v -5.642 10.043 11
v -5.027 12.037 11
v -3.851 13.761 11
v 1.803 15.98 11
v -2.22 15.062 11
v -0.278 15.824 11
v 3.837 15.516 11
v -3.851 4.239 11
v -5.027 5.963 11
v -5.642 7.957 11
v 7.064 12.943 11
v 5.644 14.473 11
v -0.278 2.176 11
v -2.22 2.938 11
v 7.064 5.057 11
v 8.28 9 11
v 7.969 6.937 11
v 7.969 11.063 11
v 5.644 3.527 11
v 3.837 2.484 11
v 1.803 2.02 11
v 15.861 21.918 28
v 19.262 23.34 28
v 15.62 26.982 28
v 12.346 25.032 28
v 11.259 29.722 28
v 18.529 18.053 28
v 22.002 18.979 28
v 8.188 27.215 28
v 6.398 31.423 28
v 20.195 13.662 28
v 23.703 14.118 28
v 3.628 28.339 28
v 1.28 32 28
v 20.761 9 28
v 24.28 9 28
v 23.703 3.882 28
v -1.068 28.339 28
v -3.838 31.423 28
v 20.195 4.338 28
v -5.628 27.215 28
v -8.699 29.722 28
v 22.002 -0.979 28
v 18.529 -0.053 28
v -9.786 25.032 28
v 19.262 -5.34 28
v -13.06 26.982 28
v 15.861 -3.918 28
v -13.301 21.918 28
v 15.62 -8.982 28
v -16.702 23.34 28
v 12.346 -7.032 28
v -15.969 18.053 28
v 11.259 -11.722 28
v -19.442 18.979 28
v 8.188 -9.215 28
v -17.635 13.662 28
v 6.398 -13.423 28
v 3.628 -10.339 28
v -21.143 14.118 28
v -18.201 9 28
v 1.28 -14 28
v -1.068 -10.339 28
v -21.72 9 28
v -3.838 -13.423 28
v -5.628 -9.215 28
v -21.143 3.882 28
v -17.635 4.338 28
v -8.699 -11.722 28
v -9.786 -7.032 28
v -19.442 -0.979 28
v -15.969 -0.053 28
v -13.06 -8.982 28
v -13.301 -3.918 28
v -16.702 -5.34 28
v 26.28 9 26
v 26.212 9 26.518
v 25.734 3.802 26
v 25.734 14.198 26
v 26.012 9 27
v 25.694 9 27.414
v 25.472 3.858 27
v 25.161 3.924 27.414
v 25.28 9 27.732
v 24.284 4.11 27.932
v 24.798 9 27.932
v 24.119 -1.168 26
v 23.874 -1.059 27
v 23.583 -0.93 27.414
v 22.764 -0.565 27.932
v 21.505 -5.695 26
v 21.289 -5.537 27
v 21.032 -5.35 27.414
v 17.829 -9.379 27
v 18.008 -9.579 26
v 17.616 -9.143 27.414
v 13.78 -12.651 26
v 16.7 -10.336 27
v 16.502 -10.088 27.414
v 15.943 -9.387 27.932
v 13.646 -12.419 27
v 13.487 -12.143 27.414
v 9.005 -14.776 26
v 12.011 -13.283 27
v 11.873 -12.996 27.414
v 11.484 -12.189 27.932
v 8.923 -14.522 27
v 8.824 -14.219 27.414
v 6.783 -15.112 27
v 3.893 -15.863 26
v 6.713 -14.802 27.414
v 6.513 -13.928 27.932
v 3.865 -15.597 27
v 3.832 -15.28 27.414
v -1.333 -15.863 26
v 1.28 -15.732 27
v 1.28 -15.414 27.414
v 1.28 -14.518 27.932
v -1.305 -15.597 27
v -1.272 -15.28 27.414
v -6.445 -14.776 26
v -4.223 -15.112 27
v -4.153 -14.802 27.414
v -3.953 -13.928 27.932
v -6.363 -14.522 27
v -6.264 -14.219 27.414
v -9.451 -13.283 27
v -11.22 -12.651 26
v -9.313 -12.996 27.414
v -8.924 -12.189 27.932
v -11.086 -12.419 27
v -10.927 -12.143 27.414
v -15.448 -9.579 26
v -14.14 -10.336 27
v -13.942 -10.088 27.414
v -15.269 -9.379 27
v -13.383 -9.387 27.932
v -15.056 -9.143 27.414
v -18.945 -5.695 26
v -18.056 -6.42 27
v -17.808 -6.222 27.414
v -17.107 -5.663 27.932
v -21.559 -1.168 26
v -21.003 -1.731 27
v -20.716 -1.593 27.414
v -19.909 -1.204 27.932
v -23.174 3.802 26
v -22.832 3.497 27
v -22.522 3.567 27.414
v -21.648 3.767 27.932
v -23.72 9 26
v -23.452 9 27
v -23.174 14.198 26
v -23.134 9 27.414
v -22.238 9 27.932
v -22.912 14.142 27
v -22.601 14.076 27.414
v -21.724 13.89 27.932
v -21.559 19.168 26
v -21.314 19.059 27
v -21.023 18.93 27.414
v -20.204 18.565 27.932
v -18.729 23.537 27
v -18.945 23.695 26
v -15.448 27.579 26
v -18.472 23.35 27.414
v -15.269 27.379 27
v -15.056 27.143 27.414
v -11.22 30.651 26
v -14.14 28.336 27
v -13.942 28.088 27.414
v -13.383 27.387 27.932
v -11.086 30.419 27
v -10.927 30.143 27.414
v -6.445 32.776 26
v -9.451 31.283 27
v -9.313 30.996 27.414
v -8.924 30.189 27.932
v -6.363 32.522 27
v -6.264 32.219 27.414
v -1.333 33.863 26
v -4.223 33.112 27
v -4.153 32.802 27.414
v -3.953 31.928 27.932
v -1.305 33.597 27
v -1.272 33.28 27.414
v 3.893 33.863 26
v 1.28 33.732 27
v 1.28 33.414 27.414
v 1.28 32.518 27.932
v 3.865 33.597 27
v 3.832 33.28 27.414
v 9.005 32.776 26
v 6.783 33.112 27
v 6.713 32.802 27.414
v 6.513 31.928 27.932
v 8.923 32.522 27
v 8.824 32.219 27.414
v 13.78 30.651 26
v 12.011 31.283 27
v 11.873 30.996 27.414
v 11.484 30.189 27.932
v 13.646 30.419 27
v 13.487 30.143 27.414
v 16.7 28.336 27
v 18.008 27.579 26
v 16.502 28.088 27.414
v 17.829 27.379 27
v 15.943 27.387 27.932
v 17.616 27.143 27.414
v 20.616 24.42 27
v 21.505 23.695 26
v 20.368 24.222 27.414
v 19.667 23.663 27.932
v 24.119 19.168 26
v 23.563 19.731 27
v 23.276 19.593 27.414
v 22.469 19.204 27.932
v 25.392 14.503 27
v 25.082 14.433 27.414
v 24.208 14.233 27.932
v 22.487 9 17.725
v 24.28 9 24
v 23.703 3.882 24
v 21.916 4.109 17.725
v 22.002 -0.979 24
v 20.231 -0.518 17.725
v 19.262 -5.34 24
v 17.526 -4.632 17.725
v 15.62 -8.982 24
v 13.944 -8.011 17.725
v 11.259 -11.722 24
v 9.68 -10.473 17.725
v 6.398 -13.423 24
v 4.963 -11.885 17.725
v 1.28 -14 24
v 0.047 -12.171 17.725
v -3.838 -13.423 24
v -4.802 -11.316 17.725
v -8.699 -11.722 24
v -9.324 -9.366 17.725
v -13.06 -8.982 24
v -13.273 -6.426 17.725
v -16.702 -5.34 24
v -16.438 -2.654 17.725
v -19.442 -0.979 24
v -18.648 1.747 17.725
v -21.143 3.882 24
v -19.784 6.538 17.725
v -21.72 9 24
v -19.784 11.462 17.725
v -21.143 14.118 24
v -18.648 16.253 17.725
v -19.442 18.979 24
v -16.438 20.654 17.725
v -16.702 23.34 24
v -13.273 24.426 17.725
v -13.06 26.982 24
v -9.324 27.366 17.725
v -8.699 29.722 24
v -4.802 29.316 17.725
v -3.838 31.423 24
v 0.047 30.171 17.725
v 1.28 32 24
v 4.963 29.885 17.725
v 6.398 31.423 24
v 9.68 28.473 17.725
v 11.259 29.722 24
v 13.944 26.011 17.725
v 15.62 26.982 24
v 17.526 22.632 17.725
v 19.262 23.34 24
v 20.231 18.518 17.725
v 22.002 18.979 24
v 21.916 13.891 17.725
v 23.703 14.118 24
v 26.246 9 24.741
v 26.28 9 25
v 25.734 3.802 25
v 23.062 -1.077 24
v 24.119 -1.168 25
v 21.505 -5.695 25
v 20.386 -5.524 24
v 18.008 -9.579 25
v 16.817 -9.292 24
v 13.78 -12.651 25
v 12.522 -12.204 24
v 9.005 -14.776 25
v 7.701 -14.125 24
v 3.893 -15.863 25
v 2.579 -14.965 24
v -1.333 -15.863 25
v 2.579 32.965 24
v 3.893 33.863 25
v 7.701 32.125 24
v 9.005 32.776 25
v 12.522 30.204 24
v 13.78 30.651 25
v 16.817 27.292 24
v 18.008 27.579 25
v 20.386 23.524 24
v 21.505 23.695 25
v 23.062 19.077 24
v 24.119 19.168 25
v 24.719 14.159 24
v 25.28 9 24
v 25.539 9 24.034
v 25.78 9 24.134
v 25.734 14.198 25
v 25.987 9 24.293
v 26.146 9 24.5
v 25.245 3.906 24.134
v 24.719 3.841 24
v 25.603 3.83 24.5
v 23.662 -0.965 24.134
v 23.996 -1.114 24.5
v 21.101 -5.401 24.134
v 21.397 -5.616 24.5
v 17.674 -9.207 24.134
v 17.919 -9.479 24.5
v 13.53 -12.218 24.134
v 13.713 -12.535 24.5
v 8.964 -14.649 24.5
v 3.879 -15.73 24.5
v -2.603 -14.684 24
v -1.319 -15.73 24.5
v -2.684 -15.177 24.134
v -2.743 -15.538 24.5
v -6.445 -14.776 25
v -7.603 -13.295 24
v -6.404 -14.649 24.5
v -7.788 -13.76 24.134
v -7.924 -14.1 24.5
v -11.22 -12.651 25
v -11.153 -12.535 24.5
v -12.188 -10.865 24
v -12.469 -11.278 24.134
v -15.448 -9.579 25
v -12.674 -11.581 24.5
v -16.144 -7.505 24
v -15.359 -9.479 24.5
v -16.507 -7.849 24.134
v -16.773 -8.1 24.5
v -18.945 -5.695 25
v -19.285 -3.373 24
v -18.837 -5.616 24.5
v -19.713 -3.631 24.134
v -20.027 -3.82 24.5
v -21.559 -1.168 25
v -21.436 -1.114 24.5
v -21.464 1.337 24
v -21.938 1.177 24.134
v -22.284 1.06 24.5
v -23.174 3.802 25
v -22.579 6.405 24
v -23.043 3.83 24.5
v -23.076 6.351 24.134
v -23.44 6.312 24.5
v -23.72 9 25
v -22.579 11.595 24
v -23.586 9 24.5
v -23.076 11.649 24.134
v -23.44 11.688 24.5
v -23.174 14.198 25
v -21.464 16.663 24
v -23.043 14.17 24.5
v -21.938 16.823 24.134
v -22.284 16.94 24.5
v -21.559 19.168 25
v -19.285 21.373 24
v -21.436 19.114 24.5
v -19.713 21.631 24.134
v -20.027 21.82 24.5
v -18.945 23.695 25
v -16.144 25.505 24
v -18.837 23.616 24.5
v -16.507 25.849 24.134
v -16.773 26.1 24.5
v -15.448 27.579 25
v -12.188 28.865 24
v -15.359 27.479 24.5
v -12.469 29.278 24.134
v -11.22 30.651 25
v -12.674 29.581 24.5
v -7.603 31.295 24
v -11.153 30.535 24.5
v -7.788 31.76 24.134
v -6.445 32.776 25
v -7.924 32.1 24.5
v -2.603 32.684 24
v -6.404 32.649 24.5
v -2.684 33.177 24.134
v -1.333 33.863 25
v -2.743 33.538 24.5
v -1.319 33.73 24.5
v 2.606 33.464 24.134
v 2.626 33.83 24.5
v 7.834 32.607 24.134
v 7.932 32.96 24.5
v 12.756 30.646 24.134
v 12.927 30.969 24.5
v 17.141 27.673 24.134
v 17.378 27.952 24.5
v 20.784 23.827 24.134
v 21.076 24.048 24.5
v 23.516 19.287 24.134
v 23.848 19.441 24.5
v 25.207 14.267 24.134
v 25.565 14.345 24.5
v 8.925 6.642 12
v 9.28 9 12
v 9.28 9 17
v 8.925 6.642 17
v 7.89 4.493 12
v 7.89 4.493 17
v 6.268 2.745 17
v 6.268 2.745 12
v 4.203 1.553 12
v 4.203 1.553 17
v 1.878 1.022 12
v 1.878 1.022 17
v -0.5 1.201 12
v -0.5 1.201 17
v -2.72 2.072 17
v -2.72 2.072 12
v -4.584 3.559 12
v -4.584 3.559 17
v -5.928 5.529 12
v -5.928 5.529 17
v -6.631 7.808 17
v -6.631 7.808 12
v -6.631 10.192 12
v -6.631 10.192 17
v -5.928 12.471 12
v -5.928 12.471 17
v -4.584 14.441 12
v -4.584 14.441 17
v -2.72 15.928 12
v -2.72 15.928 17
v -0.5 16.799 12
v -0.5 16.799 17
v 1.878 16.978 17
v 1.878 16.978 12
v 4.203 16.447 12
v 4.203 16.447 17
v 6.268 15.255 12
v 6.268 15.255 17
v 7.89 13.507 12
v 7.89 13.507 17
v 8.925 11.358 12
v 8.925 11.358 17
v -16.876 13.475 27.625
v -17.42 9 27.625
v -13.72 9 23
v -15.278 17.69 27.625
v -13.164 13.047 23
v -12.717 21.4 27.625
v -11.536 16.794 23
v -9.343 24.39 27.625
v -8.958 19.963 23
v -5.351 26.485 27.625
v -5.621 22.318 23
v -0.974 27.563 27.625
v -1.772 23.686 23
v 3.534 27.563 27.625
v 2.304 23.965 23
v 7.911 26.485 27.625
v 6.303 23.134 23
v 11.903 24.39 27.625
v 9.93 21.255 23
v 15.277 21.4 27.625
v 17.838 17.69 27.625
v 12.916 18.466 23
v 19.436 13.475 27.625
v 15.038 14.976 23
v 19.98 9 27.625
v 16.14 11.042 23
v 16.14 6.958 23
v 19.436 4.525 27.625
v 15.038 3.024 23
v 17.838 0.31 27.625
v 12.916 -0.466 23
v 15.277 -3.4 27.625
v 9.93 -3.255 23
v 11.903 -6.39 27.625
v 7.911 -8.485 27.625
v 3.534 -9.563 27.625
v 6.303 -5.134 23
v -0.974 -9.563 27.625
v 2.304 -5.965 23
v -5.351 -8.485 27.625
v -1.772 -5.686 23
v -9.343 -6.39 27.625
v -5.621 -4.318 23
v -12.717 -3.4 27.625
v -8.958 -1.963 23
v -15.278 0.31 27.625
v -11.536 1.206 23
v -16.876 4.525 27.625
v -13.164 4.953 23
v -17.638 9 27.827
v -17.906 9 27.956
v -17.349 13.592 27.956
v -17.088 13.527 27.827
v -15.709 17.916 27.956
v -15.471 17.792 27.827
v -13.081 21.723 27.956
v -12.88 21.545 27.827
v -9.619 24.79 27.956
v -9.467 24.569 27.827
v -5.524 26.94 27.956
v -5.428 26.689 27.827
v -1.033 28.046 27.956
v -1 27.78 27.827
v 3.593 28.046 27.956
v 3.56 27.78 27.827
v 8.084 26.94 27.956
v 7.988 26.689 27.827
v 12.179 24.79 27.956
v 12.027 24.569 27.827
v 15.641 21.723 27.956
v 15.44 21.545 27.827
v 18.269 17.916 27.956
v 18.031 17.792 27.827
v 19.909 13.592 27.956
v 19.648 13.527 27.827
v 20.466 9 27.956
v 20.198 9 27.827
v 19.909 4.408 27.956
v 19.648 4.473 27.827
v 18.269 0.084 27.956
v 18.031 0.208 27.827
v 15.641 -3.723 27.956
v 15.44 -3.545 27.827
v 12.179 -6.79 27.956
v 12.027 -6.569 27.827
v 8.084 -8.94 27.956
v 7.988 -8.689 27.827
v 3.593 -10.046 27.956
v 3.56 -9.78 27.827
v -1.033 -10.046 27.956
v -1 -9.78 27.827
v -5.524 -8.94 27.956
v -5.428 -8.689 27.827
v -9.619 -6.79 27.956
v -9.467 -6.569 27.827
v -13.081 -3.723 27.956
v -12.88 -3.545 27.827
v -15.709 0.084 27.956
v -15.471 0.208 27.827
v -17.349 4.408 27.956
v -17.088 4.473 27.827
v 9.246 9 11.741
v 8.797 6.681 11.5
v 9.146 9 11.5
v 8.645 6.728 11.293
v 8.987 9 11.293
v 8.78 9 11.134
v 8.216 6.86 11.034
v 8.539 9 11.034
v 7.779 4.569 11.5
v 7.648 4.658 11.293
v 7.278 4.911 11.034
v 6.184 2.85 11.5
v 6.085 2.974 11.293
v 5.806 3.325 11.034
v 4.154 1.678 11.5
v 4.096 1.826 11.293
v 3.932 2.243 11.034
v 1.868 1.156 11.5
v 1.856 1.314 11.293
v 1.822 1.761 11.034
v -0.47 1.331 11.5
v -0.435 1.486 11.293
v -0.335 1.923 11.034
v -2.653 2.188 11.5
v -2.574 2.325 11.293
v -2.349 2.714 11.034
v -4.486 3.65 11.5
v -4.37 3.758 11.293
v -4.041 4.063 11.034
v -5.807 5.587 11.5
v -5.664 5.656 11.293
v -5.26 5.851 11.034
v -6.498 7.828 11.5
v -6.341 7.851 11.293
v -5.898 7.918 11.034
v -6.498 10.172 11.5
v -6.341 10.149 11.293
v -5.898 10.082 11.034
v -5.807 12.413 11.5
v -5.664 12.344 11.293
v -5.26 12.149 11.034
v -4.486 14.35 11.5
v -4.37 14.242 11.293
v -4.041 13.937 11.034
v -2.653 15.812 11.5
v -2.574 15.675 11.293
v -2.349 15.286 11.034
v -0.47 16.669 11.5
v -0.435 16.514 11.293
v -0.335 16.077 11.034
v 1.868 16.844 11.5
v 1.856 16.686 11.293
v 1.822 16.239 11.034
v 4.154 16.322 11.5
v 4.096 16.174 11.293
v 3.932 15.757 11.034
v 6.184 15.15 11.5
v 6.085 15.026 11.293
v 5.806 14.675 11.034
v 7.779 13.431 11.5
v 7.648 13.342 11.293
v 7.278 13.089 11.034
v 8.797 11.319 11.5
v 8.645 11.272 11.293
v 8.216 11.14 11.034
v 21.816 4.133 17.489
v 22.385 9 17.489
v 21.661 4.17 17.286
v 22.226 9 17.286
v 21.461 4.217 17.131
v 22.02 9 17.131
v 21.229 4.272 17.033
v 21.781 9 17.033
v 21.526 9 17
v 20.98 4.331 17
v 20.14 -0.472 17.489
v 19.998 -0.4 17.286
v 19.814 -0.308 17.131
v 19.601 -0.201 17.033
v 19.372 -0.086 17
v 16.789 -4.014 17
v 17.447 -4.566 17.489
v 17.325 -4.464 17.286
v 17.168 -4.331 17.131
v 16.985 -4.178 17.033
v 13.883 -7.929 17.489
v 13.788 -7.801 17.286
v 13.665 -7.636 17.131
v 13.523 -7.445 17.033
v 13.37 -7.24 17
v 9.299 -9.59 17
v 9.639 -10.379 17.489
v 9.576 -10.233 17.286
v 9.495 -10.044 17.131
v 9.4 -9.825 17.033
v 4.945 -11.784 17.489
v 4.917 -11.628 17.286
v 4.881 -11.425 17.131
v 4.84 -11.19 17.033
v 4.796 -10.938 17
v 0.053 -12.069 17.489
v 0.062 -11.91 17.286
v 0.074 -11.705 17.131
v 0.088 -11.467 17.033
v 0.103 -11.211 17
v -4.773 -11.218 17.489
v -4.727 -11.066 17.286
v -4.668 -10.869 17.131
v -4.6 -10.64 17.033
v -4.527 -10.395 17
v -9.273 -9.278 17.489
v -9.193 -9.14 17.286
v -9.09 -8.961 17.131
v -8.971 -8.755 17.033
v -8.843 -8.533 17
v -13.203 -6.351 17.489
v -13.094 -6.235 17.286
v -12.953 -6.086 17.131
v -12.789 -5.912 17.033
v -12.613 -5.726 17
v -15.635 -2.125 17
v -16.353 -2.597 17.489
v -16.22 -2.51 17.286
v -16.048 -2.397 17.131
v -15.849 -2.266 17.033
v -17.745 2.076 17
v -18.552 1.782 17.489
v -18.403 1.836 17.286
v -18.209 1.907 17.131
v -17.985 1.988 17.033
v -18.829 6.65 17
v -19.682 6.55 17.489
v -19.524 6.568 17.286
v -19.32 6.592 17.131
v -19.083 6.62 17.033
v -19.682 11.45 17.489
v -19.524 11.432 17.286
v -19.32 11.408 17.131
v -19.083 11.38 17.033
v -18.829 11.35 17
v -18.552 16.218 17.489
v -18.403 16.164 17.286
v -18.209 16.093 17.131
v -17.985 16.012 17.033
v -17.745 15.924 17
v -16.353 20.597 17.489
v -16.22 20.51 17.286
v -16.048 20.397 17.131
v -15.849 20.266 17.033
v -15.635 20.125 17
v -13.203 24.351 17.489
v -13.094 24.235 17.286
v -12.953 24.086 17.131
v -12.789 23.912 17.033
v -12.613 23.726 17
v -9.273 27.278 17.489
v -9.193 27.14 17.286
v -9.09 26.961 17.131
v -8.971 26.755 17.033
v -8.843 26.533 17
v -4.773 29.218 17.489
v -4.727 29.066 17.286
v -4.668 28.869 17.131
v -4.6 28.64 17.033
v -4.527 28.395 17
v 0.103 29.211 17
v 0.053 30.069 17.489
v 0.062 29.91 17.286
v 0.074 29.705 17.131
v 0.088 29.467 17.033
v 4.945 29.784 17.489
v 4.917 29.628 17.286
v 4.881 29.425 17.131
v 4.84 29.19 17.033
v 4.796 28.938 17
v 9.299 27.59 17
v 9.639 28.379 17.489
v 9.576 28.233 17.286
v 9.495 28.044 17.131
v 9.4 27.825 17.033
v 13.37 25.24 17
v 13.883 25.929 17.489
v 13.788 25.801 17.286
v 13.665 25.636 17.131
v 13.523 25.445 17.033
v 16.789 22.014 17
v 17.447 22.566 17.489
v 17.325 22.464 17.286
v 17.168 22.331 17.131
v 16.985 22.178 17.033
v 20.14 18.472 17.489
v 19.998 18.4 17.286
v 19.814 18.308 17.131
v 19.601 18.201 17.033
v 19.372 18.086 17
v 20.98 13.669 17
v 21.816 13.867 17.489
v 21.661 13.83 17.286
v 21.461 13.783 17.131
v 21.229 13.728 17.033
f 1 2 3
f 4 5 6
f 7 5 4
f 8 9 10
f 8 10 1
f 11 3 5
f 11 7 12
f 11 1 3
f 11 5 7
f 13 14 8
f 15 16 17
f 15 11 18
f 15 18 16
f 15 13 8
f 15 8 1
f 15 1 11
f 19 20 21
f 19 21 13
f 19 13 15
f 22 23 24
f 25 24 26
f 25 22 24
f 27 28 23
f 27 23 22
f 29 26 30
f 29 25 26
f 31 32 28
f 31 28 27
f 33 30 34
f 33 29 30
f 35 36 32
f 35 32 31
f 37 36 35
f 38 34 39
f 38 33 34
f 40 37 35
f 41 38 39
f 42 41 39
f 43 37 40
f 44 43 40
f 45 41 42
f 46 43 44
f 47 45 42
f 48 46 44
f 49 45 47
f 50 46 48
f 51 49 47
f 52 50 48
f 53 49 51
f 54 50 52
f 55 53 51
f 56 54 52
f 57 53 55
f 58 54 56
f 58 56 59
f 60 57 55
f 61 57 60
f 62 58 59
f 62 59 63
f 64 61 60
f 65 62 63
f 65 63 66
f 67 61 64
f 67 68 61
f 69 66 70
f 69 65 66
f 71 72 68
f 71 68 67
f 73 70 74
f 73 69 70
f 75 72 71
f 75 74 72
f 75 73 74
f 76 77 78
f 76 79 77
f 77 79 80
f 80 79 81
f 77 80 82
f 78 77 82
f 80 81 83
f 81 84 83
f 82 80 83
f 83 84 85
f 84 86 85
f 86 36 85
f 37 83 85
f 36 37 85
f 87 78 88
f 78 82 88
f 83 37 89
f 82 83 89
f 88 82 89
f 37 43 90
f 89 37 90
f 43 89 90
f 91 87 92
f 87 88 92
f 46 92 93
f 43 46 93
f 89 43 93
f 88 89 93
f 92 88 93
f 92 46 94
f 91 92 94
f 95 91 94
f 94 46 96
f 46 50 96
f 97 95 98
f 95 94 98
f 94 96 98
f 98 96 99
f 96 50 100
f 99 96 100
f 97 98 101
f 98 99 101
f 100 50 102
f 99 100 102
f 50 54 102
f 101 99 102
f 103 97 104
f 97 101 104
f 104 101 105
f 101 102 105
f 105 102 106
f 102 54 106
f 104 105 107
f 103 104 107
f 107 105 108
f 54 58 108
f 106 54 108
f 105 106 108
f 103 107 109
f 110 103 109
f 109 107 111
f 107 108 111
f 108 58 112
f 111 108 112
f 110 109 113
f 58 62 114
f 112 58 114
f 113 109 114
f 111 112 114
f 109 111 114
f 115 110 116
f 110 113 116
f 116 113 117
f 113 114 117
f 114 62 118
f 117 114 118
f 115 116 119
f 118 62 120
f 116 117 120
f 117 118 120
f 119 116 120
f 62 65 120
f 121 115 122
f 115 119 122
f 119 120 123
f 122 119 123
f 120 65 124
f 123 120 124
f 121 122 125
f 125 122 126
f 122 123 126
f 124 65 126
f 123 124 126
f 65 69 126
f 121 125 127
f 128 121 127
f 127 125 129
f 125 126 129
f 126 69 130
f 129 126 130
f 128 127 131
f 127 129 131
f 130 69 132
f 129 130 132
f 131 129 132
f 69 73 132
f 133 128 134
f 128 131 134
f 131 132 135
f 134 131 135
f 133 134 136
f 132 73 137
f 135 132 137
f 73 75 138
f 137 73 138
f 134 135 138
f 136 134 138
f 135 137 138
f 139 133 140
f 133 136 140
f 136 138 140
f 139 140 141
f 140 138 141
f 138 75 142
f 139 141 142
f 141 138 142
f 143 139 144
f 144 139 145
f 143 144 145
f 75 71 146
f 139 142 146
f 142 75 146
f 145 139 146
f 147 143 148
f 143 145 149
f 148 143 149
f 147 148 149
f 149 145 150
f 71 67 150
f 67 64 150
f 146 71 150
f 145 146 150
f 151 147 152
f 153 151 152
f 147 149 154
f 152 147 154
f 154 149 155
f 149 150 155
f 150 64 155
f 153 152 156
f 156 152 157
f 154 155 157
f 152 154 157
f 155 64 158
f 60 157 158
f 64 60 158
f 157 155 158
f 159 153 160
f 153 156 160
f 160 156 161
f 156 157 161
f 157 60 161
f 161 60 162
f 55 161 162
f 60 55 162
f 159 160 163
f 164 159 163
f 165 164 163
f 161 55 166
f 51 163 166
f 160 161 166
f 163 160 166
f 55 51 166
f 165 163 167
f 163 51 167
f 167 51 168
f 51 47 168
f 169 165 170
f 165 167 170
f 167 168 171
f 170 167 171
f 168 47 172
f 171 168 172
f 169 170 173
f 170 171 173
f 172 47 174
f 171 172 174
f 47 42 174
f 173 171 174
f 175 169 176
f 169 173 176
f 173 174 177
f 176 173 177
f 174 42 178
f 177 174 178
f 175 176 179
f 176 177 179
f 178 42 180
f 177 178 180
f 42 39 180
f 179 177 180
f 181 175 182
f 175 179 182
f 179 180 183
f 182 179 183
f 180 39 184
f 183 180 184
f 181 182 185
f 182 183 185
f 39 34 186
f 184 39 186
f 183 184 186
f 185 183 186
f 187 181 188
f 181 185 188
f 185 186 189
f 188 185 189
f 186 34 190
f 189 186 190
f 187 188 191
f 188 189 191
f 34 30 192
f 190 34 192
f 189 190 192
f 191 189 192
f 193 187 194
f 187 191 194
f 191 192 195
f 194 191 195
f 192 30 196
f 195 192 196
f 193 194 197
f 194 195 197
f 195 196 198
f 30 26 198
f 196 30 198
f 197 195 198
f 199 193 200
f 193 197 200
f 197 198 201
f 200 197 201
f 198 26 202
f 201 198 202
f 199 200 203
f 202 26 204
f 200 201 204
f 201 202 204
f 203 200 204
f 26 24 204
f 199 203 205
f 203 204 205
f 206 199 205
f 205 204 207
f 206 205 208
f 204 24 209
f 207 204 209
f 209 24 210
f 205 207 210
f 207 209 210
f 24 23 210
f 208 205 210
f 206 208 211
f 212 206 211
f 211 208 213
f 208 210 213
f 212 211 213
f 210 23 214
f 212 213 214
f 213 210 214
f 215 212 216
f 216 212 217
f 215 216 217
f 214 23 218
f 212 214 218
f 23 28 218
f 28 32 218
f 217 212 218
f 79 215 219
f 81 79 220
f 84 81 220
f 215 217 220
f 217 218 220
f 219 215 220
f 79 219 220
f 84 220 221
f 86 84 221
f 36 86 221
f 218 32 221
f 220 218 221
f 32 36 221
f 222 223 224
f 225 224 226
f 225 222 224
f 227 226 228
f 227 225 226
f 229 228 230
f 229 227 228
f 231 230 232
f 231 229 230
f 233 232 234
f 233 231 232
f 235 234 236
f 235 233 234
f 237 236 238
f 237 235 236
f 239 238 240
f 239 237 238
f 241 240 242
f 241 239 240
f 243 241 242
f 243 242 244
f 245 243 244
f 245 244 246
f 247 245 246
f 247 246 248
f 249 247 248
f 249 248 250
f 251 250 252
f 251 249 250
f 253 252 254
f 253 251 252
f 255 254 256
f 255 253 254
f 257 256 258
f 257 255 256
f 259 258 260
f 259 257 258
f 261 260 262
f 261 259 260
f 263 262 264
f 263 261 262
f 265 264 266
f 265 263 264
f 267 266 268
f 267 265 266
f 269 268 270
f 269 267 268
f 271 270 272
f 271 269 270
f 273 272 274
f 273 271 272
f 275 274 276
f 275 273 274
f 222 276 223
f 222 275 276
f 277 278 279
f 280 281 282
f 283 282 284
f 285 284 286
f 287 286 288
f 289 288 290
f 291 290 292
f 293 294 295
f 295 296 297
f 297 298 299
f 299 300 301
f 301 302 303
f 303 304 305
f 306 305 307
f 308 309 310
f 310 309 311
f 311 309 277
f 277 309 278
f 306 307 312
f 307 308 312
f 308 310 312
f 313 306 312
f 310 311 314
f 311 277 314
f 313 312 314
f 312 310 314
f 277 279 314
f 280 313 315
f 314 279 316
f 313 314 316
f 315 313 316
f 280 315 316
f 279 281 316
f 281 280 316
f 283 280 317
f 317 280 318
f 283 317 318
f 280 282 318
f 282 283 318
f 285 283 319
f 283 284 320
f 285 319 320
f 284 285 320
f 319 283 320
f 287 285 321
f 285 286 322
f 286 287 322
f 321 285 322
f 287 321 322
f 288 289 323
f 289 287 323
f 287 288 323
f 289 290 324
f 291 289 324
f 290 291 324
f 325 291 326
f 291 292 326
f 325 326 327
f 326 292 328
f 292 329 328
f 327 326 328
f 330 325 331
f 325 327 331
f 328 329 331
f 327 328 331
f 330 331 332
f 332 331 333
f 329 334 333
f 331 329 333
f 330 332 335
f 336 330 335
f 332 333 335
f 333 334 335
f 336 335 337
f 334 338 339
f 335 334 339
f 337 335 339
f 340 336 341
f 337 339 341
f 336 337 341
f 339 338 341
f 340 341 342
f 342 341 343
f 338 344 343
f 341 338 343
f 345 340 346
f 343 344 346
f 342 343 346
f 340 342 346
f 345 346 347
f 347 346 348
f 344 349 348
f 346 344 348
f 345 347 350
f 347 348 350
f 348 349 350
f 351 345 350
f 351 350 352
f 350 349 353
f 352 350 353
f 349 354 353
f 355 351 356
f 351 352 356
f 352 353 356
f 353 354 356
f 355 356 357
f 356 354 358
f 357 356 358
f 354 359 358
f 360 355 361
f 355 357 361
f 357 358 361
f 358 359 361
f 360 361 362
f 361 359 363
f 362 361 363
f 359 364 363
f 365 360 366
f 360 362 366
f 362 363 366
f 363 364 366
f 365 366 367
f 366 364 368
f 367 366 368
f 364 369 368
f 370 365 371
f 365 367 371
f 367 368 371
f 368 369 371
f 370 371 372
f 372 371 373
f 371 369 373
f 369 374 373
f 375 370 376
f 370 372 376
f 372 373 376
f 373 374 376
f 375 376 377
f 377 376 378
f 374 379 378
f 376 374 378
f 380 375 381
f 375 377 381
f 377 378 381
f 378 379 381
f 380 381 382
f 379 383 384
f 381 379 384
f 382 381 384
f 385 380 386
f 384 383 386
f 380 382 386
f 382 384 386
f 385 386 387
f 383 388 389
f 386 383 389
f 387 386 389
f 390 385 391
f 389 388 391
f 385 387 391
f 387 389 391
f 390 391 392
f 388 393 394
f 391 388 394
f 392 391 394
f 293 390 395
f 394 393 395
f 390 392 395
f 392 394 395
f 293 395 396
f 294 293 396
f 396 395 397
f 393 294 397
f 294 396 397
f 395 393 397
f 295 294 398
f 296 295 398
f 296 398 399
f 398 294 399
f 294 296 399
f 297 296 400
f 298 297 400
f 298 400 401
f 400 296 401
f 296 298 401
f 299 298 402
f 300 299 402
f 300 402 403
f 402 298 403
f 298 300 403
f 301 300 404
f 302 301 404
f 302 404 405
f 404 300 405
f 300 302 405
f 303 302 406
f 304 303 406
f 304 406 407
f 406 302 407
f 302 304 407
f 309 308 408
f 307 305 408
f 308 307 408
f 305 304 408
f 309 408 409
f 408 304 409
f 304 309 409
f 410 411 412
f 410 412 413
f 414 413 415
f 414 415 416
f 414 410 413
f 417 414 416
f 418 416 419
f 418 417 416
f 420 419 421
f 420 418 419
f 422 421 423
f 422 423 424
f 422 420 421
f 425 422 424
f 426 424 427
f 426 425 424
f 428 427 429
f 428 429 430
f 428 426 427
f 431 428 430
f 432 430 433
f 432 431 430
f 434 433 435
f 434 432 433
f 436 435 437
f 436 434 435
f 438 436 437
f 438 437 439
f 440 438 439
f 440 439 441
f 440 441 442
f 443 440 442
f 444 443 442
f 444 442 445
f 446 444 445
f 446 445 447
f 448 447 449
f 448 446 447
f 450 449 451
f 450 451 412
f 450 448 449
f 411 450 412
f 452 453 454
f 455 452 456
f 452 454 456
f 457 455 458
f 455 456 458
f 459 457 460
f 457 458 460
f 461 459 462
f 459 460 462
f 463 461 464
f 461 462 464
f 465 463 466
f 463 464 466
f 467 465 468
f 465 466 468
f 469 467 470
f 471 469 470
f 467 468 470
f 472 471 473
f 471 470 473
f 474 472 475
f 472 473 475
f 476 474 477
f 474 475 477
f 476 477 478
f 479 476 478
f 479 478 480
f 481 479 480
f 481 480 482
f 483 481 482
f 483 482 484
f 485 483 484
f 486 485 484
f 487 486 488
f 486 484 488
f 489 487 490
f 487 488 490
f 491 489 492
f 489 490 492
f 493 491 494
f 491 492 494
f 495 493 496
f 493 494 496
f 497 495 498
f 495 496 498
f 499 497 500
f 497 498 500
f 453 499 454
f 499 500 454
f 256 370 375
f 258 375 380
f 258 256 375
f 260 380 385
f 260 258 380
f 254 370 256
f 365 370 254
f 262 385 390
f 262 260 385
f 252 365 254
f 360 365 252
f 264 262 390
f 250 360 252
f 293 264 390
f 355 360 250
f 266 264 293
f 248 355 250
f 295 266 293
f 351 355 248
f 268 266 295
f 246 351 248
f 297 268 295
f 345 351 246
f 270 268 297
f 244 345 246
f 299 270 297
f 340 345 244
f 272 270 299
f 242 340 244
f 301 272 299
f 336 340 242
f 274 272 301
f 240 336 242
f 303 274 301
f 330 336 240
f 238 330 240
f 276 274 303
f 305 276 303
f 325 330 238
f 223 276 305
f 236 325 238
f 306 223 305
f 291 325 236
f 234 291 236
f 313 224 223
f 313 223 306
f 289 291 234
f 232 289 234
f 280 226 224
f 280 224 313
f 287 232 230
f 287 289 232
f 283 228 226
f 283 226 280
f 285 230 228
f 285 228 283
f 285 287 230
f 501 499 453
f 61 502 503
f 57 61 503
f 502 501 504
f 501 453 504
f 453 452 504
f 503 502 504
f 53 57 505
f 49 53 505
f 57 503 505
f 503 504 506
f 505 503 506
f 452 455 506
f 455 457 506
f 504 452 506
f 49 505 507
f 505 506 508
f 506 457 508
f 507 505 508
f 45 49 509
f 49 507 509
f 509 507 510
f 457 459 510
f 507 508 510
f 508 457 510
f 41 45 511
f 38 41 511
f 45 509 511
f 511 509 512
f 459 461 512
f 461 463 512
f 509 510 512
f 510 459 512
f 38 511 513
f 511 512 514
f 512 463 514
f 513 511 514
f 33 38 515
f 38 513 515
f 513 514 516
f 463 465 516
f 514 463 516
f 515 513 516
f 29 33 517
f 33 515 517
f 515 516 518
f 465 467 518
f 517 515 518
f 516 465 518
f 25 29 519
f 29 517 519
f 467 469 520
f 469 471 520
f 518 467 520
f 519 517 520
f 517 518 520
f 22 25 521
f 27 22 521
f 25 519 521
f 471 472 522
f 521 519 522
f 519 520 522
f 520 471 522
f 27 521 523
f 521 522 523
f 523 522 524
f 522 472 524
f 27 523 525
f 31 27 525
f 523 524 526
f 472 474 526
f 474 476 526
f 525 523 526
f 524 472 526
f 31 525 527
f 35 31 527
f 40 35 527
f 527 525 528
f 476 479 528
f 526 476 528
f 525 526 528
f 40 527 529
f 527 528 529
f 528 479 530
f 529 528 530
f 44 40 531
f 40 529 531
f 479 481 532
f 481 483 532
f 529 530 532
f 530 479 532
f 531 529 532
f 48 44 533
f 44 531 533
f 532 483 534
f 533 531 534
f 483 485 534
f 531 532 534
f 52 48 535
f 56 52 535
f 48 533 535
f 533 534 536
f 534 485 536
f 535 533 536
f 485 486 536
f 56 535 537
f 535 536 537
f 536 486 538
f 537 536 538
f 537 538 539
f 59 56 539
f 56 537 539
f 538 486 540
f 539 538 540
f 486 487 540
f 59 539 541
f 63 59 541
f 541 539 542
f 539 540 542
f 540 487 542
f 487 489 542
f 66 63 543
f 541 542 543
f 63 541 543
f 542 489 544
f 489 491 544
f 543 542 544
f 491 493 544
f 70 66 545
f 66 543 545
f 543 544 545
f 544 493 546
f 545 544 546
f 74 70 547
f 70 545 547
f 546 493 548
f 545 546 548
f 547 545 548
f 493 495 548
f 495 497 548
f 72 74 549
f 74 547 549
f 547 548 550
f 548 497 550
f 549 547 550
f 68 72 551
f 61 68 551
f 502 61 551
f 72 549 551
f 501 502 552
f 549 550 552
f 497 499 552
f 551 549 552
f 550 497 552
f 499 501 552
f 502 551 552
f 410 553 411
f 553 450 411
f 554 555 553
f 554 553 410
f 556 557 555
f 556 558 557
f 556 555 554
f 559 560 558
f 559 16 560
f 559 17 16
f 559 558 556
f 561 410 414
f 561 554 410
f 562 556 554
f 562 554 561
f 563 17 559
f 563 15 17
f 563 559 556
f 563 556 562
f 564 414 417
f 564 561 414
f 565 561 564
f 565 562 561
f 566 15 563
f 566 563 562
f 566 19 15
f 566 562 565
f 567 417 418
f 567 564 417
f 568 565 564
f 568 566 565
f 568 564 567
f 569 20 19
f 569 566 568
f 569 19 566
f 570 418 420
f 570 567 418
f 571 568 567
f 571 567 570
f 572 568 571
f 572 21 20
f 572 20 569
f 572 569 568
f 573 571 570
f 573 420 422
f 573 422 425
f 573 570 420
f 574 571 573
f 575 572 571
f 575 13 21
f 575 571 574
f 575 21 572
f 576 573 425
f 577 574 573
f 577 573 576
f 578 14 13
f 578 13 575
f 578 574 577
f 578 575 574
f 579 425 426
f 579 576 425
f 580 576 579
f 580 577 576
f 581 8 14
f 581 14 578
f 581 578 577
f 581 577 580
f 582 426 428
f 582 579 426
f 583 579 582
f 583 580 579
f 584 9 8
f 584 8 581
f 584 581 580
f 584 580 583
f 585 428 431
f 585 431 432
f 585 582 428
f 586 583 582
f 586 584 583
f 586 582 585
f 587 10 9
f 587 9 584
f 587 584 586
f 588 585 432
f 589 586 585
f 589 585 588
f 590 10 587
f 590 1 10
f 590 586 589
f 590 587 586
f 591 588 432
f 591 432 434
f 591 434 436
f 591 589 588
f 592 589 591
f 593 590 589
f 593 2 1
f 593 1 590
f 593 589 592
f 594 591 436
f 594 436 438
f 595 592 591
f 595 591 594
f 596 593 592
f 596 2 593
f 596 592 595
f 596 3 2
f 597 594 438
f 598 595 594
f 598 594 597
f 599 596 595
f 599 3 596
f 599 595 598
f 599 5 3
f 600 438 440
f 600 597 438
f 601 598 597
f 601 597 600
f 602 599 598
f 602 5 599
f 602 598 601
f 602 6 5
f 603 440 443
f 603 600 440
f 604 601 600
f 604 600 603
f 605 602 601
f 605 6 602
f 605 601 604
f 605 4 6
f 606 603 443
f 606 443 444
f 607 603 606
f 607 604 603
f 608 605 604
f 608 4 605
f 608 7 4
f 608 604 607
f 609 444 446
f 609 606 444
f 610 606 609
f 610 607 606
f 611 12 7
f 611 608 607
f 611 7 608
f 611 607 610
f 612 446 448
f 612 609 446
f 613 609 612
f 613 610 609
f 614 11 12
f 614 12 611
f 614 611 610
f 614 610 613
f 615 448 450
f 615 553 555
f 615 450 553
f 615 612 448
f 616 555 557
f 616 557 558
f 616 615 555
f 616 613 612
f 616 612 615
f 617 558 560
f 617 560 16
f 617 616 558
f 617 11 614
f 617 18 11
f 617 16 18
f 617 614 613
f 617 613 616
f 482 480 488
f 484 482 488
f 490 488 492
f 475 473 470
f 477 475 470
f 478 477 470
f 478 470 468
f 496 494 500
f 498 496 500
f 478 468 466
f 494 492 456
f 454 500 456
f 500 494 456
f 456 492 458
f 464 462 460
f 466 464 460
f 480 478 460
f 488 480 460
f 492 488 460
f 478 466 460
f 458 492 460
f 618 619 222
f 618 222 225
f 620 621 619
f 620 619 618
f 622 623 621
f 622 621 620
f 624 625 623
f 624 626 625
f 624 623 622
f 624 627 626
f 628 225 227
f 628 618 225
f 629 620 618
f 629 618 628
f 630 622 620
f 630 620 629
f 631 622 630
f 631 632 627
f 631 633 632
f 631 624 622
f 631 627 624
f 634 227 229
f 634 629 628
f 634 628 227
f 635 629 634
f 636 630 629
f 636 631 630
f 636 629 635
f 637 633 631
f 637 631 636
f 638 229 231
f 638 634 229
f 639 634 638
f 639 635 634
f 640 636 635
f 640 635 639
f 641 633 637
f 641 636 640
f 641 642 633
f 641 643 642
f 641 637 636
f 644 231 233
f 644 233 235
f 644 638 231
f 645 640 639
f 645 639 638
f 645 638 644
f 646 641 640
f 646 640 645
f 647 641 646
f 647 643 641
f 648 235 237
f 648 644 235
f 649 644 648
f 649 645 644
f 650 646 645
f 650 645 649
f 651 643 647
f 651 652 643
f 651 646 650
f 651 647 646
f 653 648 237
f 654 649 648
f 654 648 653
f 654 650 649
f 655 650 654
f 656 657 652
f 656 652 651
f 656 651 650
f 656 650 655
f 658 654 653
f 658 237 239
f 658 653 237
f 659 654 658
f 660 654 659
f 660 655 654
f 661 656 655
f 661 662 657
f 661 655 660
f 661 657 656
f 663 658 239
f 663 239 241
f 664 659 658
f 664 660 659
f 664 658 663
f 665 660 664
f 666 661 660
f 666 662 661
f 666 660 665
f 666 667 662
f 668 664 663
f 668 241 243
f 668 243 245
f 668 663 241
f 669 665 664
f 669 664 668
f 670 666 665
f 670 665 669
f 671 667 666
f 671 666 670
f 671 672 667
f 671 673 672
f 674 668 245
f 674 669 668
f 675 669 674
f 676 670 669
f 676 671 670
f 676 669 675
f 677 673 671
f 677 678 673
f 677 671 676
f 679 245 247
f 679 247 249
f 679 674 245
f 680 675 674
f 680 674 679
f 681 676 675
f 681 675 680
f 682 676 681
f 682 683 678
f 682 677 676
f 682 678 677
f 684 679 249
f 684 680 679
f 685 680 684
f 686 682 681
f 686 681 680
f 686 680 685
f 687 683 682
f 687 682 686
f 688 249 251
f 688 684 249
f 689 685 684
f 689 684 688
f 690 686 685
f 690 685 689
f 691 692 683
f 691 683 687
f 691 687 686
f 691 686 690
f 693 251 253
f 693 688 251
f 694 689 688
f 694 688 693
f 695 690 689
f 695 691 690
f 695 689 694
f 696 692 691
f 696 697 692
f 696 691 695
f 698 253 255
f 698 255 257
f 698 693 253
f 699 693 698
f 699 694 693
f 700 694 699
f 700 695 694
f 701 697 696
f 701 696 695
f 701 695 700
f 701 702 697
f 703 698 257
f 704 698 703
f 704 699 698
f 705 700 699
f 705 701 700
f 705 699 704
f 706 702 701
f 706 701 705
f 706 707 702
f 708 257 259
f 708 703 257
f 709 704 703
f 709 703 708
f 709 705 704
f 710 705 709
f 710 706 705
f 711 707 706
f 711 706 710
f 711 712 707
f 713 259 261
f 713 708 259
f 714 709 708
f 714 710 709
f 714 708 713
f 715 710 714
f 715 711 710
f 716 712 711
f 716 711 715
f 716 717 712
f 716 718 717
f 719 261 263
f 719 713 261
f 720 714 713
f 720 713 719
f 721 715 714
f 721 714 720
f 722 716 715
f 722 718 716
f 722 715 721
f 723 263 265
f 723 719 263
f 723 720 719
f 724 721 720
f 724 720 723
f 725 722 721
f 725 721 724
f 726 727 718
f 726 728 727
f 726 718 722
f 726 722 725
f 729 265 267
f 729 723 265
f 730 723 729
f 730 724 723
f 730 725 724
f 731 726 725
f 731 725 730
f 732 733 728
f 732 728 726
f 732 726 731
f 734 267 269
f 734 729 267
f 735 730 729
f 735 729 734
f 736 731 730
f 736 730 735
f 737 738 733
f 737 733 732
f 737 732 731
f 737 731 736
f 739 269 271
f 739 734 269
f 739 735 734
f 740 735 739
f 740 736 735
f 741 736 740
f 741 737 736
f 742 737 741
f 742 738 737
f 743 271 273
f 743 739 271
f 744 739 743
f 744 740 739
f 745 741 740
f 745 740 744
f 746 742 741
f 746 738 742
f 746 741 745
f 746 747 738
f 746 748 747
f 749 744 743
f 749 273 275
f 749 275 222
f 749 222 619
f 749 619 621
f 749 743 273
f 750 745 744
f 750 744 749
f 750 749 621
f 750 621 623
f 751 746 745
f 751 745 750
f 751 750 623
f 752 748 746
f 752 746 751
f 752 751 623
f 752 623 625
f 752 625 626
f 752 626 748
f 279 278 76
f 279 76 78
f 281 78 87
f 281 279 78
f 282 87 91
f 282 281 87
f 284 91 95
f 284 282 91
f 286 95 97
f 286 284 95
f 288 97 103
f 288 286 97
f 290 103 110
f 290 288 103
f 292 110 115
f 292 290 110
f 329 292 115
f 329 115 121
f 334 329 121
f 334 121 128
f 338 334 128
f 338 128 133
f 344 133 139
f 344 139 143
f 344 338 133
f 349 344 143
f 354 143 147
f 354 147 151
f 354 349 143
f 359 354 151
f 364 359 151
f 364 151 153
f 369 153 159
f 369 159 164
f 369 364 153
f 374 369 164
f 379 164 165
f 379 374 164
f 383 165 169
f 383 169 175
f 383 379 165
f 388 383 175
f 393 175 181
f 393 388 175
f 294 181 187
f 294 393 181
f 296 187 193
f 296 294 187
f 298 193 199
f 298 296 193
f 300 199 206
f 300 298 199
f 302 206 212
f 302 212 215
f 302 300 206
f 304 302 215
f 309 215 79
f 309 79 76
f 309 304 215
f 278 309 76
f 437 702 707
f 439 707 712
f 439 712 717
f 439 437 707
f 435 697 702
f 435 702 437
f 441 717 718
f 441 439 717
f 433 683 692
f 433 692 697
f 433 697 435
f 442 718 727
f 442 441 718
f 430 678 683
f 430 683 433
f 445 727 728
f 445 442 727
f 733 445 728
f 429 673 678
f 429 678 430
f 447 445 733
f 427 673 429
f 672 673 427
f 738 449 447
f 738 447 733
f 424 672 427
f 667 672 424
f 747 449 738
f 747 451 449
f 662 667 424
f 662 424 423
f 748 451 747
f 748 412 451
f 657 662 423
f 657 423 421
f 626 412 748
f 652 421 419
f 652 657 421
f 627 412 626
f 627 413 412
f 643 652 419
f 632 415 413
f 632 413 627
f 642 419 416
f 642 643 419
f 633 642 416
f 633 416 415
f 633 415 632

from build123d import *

# Parameters (mm, degrees)
FILLET017_R               = 1
FILLET018_R               = 1
FILLET019_R               = 2
FILLET020_R               = 1
FILLET020_PLACEMENT_ANGLE = 180


with BuildPart() as cone010:
    # Cone010 → Cone010 (revolve)
    with BuildSketch(Plane.XZ):
        Polygon((0, 0), (19, 0), (15, 5), (0, 5), align=None)
    revolve(axis=Axis((0, 0, 0), (0, 0, 1)))


with BuildPart() as fillet020:
    # Sketch013 → Revolve (revolve)
    with BuildSketch(Plane.XZ):
        Polygon((0, 0), (-25, 0), (-25, 4), (-23, 4), (-21, 11), (-8, 11), (-8, 17), (0, 17), align=None)
    revolve(axis=Axis((0, 0, 0), (0, 0, 1)))

    # Fillet017
    fillet017_edges = [fillet020.edges().sort_by_distance(p)[0] for p in [
        (21, 0, 11),
        (8, 0, 17),
    ]]
    fillet(fillet017_edges, radius=FILLET017_R)

    # Fillet018
    fillet018_edges = [fillet020.edges().sort_by_distance(p)[0] for p in [
        (25, 0, 4),
    ]]
    fillet(fillet018_edges, radius=FILLET018_R)

    # Fillet019
    fillet019_edges = [fillet020.edges().sort_by_distance(p)[0] for p in [
        (25, 0, 0),
    ]]
    fillet(fillet019_edges, radius=FILLET019_R)

    # Cut014: cut Cone010
    add(cone010.part, mode=Mode.SUBTRACT)

    # Fillet020
    fillet020_edges = [fillet020.edges().sort_by_distance(p)[0] for p in [
        (-19, 0, 0),
    ]]
    fillet(fillet020_edges, radius=FILLET020_R)


with BuildPart() as fillet020_1:
    # Fillet020 placement: moved
    add(fillet020.part.moved(Location((1.28, 9, 28))).rotate(Axis((1.28, 9, 28), (0, 1, 0)), FILLET020_PLACEMENT_ANGLE))


solid = fillet020_1.part
